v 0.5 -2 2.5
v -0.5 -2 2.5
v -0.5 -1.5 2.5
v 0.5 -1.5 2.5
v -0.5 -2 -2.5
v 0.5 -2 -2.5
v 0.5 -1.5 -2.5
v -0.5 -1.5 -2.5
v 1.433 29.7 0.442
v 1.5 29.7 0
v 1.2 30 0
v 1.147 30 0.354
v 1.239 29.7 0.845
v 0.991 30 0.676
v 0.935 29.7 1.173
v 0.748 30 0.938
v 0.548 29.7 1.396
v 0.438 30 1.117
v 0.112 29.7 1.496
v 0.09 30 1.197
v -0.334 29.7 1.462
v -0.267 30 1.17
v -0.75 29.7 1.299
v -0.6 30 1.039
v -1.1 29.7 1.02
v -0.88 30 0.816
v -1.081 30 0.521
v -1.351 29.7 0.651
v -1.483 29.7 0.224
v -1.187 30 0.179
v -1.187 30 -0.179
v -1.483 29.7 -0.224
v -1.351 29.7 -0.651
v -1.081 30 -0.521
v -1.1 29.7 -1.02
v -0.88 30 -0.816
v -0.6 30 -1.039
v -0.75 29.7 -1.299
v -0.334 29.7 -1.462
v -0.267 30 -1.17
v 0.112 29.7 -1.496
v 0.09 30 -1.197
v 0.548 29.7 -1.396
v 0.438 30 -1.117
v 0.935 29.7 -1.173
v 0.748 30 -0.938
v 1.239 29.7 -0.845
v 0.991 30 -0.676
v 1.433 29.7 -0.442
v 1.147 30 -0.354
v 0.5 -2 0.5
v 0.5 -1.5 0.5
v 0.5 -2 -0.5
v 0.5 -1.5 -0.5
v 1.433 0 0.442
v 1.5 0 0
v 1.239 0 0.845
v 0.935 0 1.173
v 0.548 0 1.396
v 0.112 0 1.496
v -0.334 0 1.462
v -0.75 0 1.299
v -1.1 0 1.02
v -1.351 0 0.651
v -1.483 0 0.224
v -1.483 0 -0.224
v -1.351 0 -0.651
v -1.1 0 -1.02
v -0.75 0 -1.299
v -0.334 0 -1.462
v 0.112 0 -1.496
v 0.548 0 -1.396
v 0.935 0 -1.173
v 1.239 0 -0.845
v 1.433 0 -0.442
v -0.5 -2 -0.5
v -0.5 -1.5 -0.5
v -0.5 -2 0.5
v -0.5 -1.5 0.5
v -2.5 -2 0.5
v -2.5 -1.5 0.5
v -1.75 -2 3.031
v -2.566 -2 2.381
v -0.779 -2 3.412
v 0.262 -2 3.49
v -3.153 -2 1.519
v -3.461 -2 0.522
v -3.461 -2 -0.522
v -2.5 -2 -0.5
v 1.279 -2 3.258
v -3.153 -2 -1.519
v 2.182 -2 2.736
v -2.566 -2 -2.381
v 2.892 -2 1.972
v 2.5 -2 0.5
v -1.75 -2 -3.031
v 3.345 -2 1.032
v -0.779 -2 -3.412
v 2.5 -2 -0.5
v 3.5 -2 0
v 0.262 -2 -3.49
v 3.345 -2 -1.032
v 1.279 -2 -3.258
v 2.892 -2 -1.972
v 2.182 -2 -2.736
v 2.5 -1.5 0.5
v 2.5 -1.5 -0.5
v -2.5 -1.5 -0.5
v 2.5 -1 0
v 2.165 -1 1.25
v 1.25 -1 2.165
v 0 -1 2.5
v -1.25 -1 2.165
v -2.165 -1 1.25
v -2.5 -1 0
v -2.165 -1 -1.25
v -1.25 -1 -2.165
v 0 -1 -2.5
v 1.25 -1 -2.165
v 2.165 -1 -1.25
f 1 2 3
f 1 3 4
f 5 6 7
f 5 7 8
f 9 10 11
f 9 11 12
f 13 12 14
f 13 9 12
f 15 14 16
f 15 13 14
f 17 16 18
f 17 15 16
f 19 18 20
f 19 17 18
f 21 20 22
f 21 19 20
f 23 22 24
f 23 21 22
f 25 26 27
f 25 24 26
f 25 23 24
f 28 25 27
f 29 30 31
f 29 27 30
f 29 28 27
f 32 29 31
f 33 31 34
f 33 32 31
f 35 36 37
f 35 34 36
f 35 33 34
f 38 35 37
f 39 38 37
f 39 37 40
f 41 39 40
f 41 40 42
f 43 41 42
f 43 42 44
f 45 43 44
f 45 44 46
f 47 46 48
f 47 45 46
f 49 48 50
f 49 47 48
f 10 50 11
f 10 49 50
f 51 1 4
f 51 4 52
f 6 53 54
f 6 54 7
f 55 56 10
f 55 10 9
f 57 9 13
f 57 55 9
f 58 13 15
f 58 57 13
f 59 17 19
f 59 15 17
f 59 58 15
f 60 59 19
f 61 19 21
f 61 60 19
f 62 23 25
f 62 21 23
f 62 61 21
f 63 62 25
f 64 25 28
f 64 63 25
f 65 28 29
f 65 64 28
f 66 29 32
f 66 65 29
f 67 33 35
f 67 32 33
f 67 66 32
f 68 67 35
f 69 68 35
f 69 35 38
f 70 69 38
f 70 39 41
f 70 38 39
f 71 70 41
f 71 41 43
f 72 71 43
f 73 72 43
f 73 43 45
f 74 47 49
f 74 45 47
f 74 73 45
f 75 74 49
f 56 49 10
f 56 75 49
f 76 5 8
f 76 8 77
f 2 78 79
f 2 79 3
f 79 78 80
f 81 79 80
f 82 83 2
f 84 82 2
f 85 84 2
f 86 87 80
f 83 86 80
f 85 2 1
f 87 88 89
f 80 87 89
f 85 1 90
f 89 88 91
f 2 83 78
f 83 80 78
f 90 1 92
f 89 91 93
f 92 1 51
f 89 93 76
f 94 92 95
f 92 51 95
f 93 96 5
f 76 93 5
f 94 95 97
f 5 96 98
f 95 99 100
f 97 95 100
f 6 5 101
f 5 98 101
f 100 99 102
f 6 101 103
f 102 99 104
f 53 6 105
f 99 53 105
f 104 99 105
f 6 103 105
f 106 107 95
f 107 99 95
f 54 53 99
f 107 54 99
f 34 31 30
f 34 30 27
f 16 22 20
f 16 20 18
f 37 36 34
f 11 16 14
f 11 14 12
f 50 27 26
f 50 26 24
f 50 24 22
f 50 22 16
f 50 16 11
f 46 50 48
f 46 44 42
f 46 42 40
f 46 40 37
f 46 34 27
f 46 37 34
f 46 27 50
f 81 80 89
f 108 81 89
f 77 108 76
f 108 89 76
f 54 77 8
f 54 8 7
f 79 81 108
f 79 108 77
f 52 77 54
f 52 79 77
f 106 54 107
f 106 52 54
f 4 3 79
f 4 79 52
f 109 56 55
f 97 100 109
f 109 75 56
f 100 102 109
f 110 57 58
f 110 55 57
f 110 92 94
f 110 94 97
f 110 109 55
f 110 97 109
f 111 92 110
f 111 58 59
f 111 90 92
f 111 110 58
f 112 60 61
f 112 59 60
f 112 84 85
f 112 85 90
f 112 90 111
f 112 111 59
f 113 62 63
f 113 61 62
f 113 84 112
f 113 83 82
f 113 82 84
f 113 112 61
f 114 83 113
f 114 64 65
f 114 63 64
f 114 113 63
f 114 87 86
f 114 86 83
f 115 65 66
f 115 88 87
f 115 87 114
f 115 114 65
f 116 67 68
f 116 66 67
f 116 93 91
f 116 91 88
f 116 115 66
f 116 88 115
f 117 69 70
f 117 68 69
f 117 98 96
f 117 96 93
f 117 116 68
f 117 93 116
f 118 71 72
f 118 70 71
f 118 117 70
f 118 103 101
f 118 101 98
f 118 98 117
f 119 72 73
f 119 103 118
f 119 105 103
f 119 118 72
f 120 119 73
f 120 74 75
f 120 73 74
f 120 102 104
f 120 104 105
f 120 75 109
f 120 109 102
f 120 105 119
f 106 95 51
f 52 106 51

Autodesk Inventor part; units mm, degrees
ref_plane "YZ Plane" through (0, 0, 0) normal (1, 0, 0) x (0, 1, 0)
ref_plane "XZ Plane" through (0, 0, 0) normal (0, 1, 0) x (-1, 0, 0)
ref_plane "XY Plane" through (0, 0, 0) normal (0, 0, 1) x (1, 0, 0)
sketch "스케치1" plane through (0, 0, 0) normal (0, 0, 1) x (1, 0, 0)
  line L0 (0, 0) -> (0, 30)
  line L1 (0, 30) -> (1.5, 30)
  line L2 (1.5, 30) -> (1.5, 0)
  line L3 (0, -2) -> (3.5, -2)
  line L4 (3.5, -2) -> (1.5, 0)
  line L5 (0, 0) -> (0, -2)
  dimension "d0" = 30
  dimension "d1" = 7
  dimension "d2" = 3
  dimension "d3" = 45
revolve "회전1" add sketch "스케치1" angle 360 about axis through (0, 0, 0) along (0, 1, 0)
chamfer "모따기1" distance 0.3 angle 45 1 edges at (-1.5, 30, 0)
thread "스레드1" size "M3x0.5" class "6g" standard "ANSI Metric M Profile" full length
sketch "스케치2" plane through (0, -2, 0) normal (0, -1, 0) x (1, 0, 0)
  line L0 (-0.5, 2.5) -> (0.5, 2.5)
  line L1 (0.5, 2.5) -> (0.5, -2.5)
  line L2 (0.5, -2.5) -> (-0.5, -2.5)
  line L3 (-0.5, -2.5) -> (-0.5, 2.5)
  circle A0 centre (0, 0) radius 1.2 construction
  line L4 (-0.5, 2.5) -> (0.5, -2.5) construction
  line L5 (0.5, 2.5) -> (-0.5, -2.5) construction
  line L6 (-2.5, -0.5) -> (2.5, -0.5)
  line L7 (2.5, -0.5) -> (2.5, 0.5)
  line L8 (2.5, 0.5) -> (-2.5, 0.5)
  line L9 (-2.5, 0.5) -> (-2.5, -0.5)
  line L10 (-2.5, -0.5) -> (2.5, 0.5) construction
  line L11 (2.5, -0.5) -> (-2.5, 0.5) construction
  point P0 (-0.5, 0.5)
  point P1 (-0.5, -0.5)
  point P2 (0.5, -0.5)
  point P3 (0.5, 0.5)
  dimension "d10" = 1
  dimension "d11" = 5
  dimension "d12" = 5
  dimension "d13" = 1
extrude "돌출1" cut sketch "스케치2" against normal blind 0.5
properties part number "M3 30mm 십자나사"
